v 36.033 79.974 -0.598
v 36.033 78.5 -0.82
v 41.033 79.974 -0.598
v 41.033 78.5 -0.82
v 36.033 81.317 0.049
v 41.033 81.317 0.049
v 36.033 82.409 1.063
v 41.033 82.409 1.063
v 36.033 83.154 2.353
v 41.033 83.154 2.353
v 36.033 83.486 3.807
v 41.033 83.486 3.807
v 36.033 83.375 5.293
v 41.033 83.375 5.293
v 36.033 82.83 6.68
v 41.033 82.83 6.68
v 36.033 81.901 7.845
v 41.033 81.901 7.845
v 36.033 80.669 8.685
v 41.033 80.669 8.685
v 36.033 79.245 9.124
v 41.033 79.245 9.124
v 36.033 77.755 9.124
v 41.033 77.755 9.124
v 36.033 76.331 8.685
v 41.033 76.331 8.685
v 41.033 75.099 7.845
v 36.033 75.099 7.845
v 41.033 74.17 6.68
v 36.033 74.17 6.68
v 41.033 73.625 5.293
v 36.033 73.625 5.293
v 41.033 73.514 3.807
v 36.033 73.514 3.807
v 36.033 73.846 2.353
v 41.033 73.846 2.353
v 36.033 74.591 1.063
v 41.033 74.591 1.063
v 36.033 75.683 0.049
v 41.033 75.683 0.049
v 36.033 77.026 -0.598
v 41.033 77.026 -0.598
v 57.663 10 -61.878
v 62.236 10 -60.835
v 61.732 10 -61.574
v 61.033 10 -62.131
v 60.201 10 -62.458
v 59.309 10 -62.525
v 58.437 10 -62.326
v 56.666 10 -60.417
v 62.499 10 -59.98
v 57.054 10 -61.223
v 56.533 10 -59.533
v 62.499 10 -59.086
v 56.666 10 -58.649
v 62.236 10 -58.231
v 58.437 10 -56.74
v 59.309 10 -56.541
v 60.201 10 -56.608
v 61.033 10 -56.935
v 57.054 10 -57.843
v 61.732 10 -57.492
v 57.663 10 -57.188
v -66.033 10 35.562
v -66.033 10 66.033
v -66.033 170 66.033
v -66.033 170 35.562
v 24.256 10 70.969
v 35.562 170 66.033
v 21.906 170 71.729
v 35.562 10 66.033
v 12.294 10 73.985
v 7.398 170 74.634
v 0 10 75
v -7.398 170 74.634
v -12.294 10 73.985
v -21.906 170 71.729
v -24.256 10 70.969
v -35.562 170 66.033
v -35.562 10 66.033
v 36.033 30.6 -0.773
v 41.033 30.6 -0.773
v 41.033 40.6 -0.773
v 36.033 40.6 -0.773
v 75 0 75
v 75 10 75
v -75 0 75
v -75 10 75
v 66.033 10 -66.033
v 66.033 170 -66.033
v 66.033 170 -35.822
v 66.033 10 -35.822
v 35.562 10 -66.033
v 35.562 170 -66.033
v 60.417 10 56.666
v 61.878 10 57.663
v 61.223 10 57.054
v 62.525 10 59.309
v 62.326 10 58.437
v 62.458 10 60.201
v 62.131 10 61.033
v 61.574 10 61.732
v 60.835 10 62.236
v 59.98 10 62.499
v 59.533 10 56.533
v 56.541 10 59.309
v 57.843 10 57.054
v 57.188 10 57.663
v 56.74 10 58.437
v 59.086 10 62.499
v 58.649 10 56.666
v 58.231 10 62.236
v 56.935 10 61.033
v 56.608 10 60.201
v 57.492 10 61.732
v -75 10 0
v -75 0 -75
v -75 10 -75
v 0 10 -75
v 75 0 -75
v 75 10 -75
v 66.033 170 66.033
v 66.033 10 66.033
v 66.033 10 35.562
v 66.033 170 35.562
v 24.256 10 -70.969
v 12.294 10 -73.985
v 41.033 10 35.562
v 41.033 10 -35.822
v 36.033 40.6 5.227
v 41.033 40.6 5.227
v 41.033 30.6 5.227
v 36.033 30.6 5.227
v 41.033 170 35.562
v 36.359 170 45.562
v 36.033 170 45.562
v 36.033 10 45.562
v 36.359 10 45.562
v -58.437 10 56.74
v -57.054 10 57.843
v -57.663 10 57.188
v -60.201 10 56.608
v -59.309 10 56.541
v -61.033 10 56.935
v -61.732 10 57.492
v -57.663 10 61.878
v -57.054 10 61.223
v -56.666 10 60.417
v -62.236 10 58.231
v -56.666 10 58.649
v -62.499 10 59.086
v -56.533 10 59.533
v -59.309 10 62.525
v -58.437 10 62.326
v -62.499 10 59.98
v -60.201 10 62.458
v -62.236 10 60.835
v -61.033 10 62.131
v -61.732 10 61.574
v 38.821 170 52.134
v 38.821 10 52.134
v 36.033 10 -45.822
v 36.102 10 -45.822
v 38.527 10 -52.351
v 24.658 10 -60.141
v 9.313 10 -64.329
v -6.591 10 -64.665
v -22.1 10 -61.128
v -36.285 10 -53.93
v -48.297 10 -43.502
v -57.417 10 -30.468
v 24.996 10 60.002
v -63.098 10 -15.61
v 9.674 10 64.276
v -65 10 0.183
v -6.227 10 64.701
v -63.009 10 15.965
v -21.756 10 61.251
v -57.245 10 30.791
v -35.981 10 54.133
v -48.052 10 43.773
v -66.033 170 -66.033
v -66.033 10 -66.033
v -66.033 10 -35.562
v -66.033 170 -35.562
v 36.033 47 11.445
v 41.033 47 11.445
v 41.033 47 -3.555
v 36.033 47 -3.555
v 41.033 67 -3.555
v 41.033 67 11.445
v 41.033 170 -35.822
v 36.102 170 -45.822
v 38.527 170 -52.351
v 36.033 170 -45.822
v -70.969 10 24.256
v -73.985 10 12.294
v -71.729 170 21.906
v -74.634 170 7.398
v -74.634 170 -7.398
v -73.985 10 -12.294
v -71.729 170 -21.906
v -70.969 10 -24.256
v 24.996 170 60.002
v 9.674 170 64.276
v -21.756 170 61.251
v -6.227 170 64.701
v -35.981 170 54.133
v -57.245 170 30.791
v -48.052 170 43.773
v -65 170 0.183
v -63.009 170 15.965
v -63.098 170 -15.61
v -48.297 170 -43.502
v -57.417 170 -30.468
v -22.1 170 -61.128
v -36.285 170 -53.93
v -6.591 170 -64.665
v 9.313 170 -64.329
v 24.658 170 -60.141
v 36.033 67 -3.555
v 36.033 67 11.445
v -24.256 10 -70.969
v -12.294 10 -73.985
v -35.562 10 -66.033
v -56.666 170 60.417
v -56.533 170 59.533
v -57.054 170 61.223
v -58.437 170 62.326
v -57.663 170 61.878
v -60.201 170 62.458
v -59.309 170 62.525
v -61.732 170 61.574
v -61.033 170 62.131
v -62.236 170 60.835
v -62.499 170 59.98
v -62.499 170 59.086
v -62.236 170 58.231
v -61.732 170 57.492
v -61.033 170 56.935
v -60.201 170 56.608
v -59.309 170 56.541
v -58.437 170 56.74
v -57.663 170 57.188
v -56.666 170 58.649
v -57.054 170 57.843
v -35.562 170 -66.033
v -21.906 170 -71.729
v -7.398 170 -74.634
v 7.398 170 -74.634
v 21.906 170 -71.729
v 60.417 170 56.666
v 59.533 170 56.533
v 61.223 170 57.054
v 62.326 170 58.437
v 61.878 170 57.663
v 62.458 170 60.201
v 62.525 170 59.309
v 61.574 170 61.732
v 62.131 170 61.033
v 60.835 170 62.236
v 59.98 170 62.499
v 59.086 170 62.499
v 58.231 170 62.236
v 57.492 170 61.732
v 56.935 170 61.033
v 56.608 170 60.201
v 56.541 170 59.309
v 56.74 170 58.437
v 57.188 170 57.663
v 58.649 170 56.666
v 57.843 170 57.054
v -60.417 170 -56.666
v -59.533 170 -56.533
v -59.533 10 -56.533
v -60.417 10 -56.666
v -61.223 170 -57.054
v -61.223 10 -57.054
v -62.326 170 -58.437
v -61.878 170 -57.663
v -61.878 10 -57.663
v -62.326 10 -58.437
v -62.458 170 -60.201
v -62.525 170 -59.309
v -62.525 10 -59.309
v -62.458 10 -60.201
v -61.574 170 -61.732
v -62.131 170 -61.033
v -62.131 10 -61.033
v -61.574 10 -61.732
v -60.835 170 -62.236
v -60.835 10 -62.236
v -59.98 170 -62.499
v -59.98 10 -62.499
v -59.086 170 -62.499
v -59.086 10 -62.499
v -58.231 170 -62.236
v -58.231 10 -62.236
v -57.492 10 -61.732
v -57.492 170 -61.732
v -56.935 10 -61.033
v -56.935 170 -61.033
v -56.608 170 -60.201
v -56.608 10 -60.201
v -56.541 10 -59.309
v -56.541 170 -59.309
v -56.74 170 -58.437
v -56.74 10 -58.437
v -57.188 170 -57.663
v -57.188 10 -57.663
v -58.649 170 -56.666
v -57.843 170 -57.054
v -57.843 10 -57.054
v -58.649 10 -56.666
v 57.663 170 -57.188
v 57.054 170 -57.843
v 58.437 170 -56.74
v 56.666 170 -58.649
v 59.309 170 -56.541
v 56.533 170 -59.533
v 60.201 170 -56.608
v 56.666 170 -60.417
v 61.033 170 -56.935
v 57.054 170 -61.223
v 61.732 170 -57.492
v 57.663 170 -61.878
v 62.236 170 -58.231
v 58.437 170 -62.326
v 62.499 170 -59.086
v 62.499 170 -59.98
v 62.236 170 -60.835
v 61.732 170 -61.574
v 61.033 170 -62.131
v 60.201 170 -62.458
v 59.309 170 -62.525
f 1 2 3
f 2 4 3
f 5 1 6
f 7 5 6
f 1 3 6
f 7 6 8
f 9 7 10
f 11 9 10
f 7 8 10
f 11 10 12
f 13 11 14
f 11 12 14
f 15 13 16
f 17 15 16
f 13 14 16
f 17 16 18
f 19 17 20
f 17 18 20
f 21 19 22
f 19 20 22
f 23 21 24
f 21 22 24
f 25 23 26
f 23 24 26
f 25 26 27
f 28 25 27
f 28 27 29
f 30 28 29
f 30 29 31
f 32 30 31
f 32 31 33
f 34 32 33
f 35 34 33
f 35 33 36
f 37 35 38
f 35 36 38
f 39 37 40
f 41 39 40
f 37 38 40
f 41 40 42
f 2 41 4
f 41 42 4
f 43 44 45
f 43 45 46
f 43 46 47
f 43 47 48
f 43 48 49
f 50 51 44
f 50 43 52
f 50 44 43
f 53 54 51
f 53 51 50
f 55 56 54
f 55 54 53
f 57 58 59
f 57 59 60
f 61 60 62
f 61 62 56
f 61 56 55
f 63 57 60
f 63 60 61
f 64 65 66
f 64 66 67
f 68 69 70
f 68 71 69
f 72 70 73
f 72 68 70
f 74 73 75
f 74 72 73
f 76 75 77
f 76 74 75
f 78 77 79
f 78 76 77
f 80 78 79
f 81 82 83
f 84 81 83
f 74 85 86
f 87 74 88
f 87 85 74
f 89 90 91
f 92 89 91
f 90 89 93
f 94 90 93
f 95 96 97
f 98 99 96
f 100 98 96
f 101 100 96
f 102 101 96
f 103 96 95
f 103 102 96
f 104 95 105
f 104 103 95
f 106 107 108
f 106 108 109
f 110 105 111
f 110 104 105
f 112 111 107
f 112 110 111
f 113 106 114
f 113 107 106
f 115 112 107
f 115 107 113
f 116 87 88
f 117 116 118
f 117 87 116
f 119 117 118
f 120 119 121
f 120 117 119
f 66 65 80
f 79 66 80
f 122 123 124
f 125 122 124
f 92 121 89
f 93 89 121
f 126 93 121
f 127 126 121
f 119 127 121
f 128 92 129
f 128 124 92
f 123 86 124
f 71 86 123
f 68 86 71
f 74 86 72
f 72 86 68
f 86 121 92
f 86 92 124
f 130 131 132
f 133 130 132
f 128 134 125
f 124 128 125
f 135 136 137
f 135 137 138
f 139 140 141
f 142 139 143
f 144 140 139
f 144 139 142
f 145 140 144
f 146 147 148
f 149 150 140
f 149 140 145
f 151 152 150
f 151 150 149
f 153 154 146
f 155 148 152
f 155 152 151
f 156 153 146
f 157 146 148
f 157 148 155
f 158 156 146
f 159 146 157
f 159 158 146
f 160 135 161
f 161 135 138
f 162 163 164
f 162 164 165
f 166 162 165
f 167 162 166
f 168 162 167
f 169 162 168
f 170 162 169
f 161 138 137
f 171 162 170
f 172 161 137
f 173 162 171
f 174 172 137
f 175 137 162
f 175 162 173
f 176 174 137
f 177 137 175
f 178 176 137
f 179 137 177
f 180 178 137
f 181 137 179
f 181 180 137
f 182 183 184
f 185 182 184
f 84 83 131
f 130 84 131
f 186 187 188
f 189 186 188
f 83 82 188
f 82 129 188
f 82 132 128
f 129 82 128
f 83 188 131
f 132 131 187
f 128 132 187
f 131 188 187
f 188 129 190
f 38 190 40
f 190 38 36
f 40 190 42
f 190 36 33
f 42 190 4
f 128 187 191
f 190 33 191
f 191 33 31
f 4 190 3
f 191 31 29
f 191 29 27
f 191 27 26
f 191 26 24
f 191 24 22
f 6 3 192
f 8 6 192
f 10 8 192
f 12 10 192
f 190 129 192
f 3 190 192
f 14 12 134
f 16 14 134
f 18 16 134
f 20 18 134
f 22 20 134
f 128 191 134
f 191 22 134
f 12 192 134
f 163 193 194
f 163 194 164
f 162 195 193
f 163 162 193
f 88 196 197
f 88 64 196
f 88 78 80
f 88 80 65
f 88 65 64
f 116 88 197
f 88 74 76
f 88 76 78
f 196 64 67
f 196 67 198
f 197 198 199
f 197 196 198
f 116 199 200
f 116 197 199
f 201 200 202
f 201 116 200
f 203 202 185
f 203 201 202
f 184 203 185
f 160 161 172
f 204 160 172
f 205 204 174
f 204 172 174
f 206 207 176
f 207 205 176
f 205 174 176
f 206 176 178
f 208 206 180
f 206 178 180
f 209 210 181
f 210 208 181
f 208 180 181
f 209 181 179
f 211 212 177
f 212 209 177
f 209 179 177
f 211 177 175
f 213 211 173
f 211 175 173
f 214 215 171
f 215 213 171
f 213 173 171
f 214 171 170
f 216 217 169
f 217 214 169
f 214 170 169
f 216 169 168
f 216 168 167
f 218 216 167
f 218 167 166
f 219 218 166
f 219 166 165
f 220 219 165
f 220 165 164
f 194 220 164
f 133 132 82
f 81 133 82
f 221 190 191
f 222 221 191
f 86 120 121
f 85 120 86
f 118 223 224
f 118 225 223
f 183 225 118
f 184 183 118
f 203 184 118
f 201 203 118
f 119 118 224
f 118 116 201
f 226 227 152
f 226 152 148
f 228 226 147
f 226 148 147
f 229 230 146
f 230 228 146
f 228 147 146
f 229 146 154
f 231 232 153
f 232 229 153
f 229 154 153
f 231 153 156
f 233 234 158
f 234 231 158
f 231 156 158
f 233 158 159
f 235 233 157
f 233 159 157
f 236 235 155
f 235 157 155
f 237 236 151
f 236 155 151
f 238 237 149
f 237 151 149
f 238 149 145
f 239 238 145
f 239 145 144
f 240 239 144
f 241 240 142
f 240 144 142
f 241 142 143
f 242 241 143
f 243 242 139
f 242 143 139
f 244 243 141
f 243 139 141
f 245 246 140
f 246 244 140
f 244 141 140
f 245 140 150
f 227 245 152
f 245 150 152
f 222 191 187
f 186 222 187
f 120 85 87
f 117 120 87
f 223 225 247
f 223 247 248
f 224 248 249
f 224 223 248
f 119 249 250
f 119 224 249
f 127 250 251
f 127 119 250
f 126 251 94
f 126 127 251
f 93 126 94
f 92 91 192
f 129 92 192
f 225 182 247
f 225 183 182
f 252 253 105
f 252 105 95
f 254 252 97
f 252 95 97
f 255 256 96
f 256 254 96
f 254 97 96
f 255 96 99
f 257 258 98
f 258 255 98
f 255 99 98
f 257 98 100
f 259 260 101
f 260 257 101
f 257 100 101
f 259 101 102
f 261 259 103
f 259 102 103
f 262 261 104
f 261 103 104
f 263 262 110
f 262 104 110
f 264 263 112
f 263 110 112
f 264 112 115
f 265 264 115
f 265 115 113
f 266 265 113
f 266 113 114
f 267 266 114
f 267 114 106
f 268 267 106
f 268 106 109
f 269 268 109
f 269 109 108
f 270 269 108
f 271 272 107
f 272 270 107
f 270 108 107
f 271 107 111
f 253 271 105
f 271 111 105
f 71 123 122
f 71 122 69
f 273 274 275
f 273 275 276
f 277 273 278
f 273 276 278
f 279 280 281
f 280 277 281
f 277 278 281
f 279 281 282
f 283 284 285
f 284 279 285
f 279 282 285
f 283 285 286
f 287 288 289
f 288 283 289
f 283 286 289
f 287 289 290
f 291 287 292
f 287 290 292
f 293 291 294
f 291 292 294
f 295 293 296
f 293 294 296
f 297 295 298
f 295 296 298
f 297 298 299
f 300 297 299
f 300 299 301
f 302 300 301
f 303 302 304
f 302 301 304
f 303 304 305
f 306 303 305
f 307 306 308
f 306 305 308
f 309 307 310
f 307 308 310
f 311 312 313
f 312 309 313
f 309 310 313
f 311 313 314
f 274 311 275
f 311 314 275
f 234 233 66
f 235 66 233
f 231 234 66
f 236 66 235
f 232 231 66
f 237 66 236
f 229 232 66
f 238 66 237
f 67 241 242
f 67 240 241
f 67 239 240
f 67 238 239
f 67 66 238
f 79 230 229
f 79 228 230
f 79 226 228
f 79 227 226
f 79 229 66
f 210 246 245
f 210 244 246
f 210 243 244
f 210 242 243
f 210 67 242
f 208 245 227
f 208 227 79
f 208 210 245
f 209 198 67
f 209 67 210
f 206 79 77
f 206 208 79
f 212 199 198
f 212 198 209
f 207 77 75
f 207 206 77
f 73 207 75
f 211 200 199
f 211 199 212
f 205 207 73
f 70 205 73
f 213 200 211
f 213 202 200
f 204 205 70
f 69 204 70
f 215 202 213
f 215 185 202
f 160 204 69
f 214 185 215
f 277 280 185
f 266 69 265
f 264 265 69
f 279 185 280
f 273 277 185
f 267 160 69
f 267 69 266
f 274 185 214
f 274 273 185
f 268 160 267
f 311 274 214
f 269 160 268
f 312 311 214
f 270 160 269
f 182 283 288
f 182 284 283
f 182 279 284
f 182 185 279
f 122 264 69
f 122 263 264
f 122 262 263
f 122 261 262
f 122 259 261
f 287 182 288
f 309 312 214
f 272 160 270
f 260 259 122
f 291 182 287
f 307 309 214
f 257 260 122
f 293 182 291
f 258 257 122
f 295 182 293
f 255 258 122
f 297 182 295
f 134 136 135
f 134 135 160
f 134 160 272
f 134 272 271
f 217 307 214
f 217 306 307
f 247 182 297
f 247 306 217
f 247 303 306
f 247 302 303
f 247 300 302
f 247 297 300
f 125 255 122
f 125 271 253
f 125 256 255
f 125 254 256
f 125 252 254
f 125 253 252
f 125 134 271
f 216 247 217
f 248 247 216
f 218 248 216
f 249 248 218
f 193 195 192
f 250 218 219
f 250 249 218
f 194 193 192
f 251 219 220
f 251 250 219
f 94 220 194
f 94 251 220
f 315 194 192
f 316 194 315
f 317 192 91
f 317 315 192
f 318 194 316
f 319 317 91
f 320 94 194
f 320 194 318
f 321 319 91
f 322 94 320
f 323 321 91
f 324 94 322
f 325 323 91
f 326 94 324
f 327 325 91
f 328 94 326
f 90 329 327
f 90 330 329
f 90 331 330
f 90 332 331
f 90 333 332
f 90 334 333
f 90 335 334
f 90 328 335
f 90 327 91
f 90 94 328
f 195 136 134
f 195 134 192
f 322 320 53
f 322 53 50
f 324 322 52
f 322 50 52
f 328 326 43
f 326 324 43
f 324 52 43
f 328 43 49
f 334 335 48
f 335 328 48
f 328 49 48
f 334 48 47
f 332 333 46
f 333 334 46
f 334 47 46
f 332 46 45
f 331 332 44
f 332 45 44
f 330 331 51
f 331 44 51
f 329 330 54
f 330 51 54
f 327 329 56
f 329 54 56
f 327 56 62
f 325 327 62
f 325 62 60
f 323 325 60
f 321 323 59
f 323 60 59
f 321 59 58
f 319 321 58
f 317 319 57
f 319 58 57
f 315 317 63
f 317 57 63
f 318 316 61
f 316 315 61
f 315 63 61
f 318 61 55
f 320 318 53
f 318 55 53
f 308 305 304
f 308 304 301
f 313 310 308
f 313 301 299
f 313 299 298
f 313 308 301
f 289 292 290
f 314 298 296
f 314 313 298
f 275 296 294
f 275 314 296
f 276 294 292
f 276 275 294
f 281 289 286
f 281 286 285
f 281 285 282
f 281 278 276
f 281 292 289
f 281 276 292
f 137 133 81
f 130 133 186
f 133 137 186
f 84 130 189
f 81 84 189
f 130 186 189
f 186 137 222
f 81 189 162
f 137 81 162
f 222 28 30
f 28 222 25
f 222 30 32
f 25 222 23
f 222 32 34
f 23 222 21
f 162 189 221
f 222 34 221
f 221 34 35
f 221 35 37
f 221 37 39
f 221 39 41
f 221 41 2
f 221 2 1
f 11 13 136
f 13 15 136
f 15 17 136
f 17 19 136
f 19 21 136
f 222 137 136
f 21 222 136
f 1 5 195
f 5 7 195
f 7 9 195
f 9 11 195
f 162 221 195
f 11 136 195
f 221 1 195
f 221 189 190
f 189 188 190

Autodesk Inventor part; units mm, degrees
ref_plane "YZ Plane" through (0, 0, 0) normal (1, 0, 0) x (0, 1, 0)
ref_plane "XZ Plane" through (0, 0, 0) normal (0, 1, 0) x (-1, 0, 0)
ref_plane "XY Plane" through (0, 0, 0) normal (0, 0, 1) x (1, 0, 0)
sketch "Эскиз1" plane through (0, 0, 0) normal (0, 1, 0) x (-1, 0, 0)
  line L0 (-75, 75) -> (75, 75)
  line L1 (75, 75) -> (75, -75)
  line L2 (75, -75) -> (-75, -75)
  line L3 (-75, -75) -> (-75, 75)
  line L4 (-75, 75) -> (75, -75) construction
  line L5 (75, 75) -> (-75, -75) construction
  point P0 (0, 0)
  dimension "d0" = 150
  dimension "d1" = 150
extrude "Выдавливание1" add sketch "Эскиз1" along normal blind 10
sketch "Эскиз2" plane through (0, 10, 0) normal (0, 1, 0) x (1, 0, 0)
  circle A0 centre (0, 0) radius 75
  circle A1 centre (0, 0) radius 65
  dimension "d4" = 150
  dimension "d5" = 130
extrude "Выдавливание2" add sketch "Эскиз2" along normal blind 160
sketch "Эскиз3" plane through (0, 10, 0) normal (0, 1, 0) x (1, 0, 0)
  line L0 (0, 0) -> (-53.033, -53.033)
  arc A0 (-75, 0) -> (0, -75) centre (0, 0) ccw projected
  line L1 (0, 0) -> (75, 0) construction
  line L2 (-53.033, -53.033) -> (-66.033, -53.033)
  line L3 (-66.033, -53.033) -> (-66.033, -66.033)
  line L4 (-66.033, -66.033) -> (-53.033, -66.033)
  line L5 (-53.033, -66.033) -> (-53.033, -53.033)
  line L6 (-53.033, -66.033) -> (-35.5618, -66.033)
  line L7 (-66.033, -53.033) -> (-66.033, -35.5618)
  arc A1 (-66.033, -35.5618) -> (-35.5618, -66.033) centre (0, 0) ccw
  circle A2 centre (-59.533, -59.533) radius 3
  dimension "d8" = 135
  dimension "d9" = 13
  dimension "d10" = 13
  dimension "d11" = 6
  dimension "d12" = 6.5
  dimension "d13" = 6.5
extrude "Выдавливание3" add sketch "Эскиз3" along normal up to surface (160 mm away)
pattern_circular "Круговой массив1" count 4 over 360 about axis through (0, 10, 0) along (0, 1, 0) of "Выдавливание3"
sketch "Эскиз5" plane through (0, 170, 0) normal (0, 1, 0) x (1, 0, 0)
  line L0 (75, 0) -> (75, 75) projected
  line L1 (75, 35.8218) -> (45, 35.8218)
  line L2 (45, 35.8218) -> (45, -35.5618)
  line L3 (45, -35.5618) -> (75, -35.5618)
  line L4 (75, -35.5618) -> (75, 35.8218)
  point P0 (0, 0)
  dimension "d21" = 30
extrude "Выдавливание5" cut sketch "Эскиз5" against normal up to surface (160 mm away)
sketch "Эскиз6" plane through (0, 170, 0) normal (0, 1, 0) x (1, 0, 0)
  line L0 (66.033, 66.033) -> (66.033, 35.8218) projected
  line L1 (66.033, 35.8218) -> (36.033, 35.8218)
  line L2 (36.033, 35.8218) -> (36.033, 45.8218)
  line L3 (36.033, 45.8218) -> (66.033, 45.8218)
  line L4 (66.033, 45.8218) -> (66.033, 35.8218)
  arc A0 (54.2384, 35.8218) -> (54.4092, -35.5618) centre (0, 0) ccw projected
  line L5 (36.033, 45.8218) -> (46.6128, 45.8218)
  line L6 (66.033, -35.5618) -> (66.033, -66.033) projected
  line L7 (66.033, -35.5618) -> (36.033, -35.5618)
  line L8 (36.033, -35.5618) -> (36.033, -45.5618)
  line L9 (36.033, -45.5618) -> (66.033, -45.5618)
  line L10 (66.033, -45.5618) -> (66.033, -35.5618)
  line L11 (36.033, 45.8218) -> (41.033, 45.8218)
  line L12 (41.033, 45.8218) -> (41.033, -45.5618)
  line L13 (41.033, -45.5618) -> (36.033, -45.5618)
  line L14 (36.033, -45.5618) -> (36.033, 45.8218)
  dimension "d24" = 30
  dimension "d25" = 10
  dimension "d26" = 30
  dimension "d27" = 10
  dimension "d28" = 5
extrude "Выдавливание6" add sketch "Эскиз6" against normal up to surface (160 mm away) contours L0 L1 A0 L3 | L1 L12 L3 A0 | L12 L7 L14 L1 | L1 L2 L3 L12 | L9 L12 L7 A0 | A0 L7 L6 L9 | L12 L9 L8 L7
sketch "Эскиз7" plane through (41.033, 170, 35.5618) normal (1, 0, 0) x (0, 0, -1)
  point P0 (35.5618, -170)
sketch "Эскиз8" plane through (41.033, 170, 35.5618) normal (1, 0, 0) x (0, 0, -1)
  circle A0 centre (31.3816, -91.5) radius 2.1
  line L0 (33.0222, -106.4854) -> (32.894, -106.0661)
  arc A1 (33.0222, -106.4854) -> (33.2588, -106.8521) centre (33.7873, -106.2515) ccw
  line L1 (34.1201, -107.61) -> (33.2588, -106.8521)
  line L2 (34.3916, -117.7894) -> (34.3916, -108.2106)
  arc A2 (34.3916, -108.2106) -> (34.1201, -107.61) centre (33.5916, -108.2106) ccw
  arc A3 (34.1201, -118.39) -> (34.3916, -117.7894) centre (33.5916, -117.7894) ccw
  line L3 (33.2588, -119.1479) -> (34.1201, -118.39)
  line L4 (32.894, -119.9339) -> (33.0222, -119.5146)
  arc A4 (33.2588, -119.1479) -> (33.0222, -119.5146) centre (33.7873, -119.7485) ccw
  arc A5 (32.129, -120.5) -> (32.894, -119.9339) centre (32.129, -119.7) ccw
  line L5 (29.6416, -120.5) -> (32.129, -120.5)
  arc A6 (28.8416, -119.7) -> (29.6416, -120.5) centre (29.6416, -119.7) ccw
  line L6 (28.8416, -106.3) -> (28.8416, -119.7)
  arc A7 (29.6416, -105.5) -> (28.8416, -106.3) centre (29.6416, -106.3) ccw
  line L7 (32.129, -105.5) -> (29.6416, -105.5)
  arc A8 (32.894, -106.0661) -> (32.129, -105.5) centre (32.129, -106.3) ccw
  line L8 (34.2451, -137.4464) -> (33.688, -138.0036)
  line L9 (32.6416, -138.15) -> (33.3345, -138.15)
  arc A9 (33.3345, -138.15) -> (33.688, -138.0036) centre (33.3345, -137.65) ccw
  arc A10 (32.1416, -137.65) -> (32.6416, -138.15) centre (32.6416, -137.65) ccw
  line L10 (32.1416, -131.15) -> (32.1416, -137.65)
  arc A11 (32.6416, -130.65) -> (32.1416, -131.15) centre (32.6416, -131.15) ccw
  line L11 (33.3345, -130.65) -> (32.6416, -130.65)
  line L12 (33.688, -130.7964) -> (34.2451, -131.3536)
  arc A12 (33.688, -130.7964) -> (33.3345, -130.65) centre (33.3345, -131.15) ccw
  arc A13 (34.3916, -131.7071) -> (34.2451, -131.3536) centre (33.8916, -131.7071) ccw
  line L13 (34.3916, -142.5) -> (34.3916, -62.5)
  line L14 (28.8416, -113) -> (34.3916, -113)
  line L15 (24.1166, -123) -> (39.1166, -123)
  line L16 (39.1166, -123) -> (39.1166, -103)
  line L17 (39.1166, -103) -> (24.1166, -103)
  line L18 (24.1166, -103) -> (24.1166, -123)
  line L19 (24.1166, -123) -> (39.1166, -103) construction
  line L20 (39.1166, -123) -> (24.1166, -103) construction
  line L21 (30.3345, -139.4) -> (36.3345, -139.4)
  line L22 (36.3345, -139.4) -> (36.3345, -129.4)
  line L23 (36.3345, -129.4) -> (30.3345, -129.4)
  line L24 (30.3345, -129.4) -> (30.3345, -139.4)
  line L25 (30.3345, -139.4) -> (36.3345, -129.4) construction
  line L26 (36.3345, -139.4) -> (30.3345, -129.4) construction
  circle A14 centre (31.3816, -91.5) radius 5
  circle A15 centre (31.3816, -91.5) radius 2.1
  line L27 (33.0222, -106.4854) -> (32.894, -106.0661)
  arc A16 (33.0222, -106.4854) -> (33.2588, -106.8521) centre (33.7873, -106.2515) ccw
  line L28 (34.1201, -107.61) -> (33.2588, -106.8521)
  line L29 (34.3916, -117.7894) -> (34.3916, -108.2106)
  arc A17 (34.3916, -108.2106) -> (34.1201, -107.61) centre (33.5916, -108.2106) ccw
  arc A18 (34.1201, -118.39) -> (34.3916, -117.7894) centre (33.5916, -117.7894) ccw
  line L30 (33.2588, -119.1479) -> (34.1201, -118.39)
  line L31 (32.894, -119.9339) -> (33.0222, -119.5146)
  arc A19 (33.2588, -119.1479) -> (33.0222, -119.5146) centre (33.7873, -119.7485) ccw
  arc A20 (32.129, -120.5) -> (32.894, -119.9339) centre (32.129, -119.7) ccw
  line L32 (29.6416, -120.5) -> (32.129, -120.5)
  arc A21 (28.8416, -119.7) -> (29.6416, -120.5) centre (29.6416, -119.7) ccw
  line L33 (28.8416, -106.3) -> (28.8416, -119.7)
  arc A22 (29.6416, -105.5) -> (28.8416, -106.3) centre (29.6416, -106.3) ccw
  line L34 (32.129, -105.5) -> (29.6416, -105.5)
  arc A23 (32.894, -106.0661) -> (32.129, -105.5) centre (32.129, -106.3) ccw
  line L35 (34.2451, -137.4464) -> (33.688, -138.0036)
  line L36 (32.6416, -138.15) -> (33.3345, -138.15)
  arc A24 (33.3345, -138.15) -> (33.688, -138.0036) centre (33.3345, -137.65) ccw
  arc A25 (32.1416, -137.65) -> (32.6416, -138.15) centre (32.6416, -137.65) ccw
  line L37 (32.1416, -131.15) -> (32.1416, -137.65)
  arc A26 (32.6416, -130.65) -> (32.1416, -131.15) centre (32.6416, -131.15) ccw
  line L38 (33.3345, -130.65) -> (32.6416, -130.65)
  line L39 (33.688, -130.7964) -> (34.2451, -131.3536)
  arc A27 (33.688, -130.7964) -> (33.3345, -130.65) centre (33.3345, -131.15) ccw
  arc A28 (34.3916, -131.7071) -> (34.2451, -131.3536) centre (33.8916, -131.7071) ccw
  line L40 (34.3916, -142.5) -> (34.3916, -62.5)
  line L41 (28.8416, -113) -> (34.3916, -113)
  line L42 (24.1166, -123) -> (39.1166, -123)
  line L43 (39.1166, -123) -> (39.1166, -103)
  line L44 (39.1166, -103) -> (24.1166, -103)
  line L45 (24.1166, -103) -> (24.1166, -123)
  line L46 (24.1166, -123) -> (39.1166, -103) construction
  line L47 (39.1166, -123) -> (24.1166, -103) construction
  line L48 (30.3345, -139.4) -> (36.3345, -139.4)
  line L49 (36.3345, -139.4) -> (36.3345, -129.4)
  line L50 (36.3345, -129.4) -> (30.3345, -129.4)
  line L51 (30.3345, -129.4) -> (30.3345, -139.4)
  line L52 (30.3345, -139.4) -> (36.3345, -129.4) construction
  line L53 (36.3345, -139.4) -> (30.3345, -129.4) construction
  circle A29 centre (31.3816, -91.5) radius 5
  point P0 (35.5618, -170)
  point P1 (31.6166, -113)
  point P2 (33.3345, -134.4)
  point P3 (31.6166, -113)
  point P4 (33.3345, -134.4)
  dimension "d31" = 15
  dimension "d32" = 20
  dimension "d33" = 6
  dimension "d34" = 10
  dimension "d35" = 10
  dimension "d36" = 15
  dimension "d37" = 20
  dimension "d38" = 6
  dimension "d39" = 10
  dimension "d40" = 10
extrude "Выдавливание7" cut sketch "Эскиз8" against normal blind 10 contours A0 | A1 L1 A2 L2 L14 L6 A7 L7 A8 L0 | L0 A8 L7 A7 L6 A6 L5 A5 L4 A4 L3 A3 L13 L15 L18 L17 A2 L1 A1 | L13 L17 L16 L15 L2 | L2 A3 L3 A4 L4 A5 L5 A6 L6 L14 | A14 L13 | L13 A14 | L23 L22 L21 L13 | L13 L21 L24 L23
chamfer "Фаска1" distance 10 angle 45 2 edges at (46.3586, 90, 45.5618) (46.1017, 90, -45.8218)
properties part number "000.201 - Станина" material "Пластик АБС"
